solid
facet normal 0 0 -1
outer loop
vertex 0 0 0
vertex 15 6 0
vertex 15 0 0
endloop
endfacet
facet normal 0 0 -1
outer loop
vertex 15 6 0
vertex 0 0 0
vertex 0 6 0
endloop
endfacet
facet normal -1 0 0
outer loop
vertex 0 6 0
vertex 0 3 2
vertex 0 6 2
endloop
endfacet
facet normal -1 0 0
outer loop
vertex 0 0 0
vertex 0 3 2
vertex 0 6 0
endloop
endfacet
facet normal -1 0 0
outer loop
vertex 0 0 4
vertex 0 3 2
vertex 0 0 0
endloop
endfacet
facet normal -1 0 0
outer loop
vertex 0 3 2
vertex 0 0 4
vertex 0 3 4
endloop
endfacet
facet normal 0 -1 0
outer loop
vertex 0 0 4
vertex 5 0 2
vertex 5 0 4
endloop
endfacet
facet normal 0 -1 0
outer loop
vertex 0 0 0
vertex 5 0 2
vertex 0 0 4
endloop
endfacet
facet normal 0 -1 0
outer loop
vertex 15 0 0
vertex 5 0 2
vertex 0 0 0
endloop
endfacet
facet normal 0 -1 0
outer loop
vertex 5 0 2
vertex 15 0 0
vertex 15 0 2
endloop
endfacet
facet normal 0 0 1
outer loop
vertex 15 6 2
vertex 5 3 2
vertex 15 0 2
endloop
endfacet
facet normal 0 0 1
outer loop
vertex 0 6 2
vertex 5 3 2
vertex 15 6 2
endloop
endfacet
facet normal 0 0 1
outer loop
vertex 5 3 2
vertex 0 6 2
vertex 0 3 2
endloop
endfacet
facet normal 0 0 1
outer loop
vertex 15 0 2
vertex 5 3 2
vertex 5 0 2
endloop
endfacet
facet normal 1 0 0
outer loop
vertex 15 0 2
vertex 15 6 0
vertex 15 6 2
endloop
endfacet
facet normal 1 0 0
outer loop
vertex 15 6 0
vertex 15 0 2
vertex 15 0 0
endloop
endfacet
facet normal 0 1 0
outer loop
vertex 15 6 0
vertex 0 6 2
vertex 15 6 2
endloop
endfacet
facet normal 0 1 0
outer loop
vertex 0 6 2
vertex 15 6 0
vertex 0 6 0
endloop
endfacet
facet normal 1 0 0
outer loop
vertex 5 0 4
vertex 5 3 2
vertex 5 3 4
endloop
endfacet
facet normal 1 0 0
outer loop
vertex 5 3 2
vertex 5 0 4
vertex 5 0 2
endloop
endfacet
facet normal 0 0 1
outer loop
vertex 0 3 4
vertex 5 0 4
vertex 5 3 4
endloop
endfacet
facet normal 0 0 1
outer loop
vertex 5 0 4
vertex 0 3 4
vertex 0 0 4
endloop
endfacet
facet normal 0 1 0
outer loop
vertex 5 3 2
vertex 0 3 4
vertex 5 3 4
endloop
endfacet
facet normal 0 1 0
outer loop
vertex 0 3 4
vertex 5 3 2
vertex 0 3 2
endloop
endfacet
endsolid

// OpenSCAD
translate([2.5, 1.5, 1.0]) color([0.6205381083165517, 0.041202949506209285, 0.16386054567557595]) cube([5, 3, 2], center=true);
translate([7.5, 1.5, 1.0]) color([0.9819140701253054, 0.28953085363586695, 0.39479198298829066]) cube([5, 3, 2], center=true);
translate([12.5, 1.5, 1.0]) color([0.5484842965725134, 0.29340700145733656, 0.47806466915102097]) cube([5, 3, 2], center=true);
translate([2.5, 4.5, 1.0]) color([0.2397060836386239, 0.04825636228829444, 0.17958684904155564]) cube([5, 3, 2], center=true);
translate([7.5, 4.5, 1.0]) color([0.5230502317000981, 0.07086288409434749, 0.4031691464450935]) cube([5, 3, 2], center=true);
translate([12.5, 4.5, 1.0]) color([0.3285207100154869, 0.4147216089714424, 0.09940033823870109]) cube([5, 3, 2], center=true);
translate([2.5, 1.5, 3.0]) color([0.9086575543967805, 0.4740046511372964, 0.8408483326276716]) cube([5, 3, 2], center=true);
